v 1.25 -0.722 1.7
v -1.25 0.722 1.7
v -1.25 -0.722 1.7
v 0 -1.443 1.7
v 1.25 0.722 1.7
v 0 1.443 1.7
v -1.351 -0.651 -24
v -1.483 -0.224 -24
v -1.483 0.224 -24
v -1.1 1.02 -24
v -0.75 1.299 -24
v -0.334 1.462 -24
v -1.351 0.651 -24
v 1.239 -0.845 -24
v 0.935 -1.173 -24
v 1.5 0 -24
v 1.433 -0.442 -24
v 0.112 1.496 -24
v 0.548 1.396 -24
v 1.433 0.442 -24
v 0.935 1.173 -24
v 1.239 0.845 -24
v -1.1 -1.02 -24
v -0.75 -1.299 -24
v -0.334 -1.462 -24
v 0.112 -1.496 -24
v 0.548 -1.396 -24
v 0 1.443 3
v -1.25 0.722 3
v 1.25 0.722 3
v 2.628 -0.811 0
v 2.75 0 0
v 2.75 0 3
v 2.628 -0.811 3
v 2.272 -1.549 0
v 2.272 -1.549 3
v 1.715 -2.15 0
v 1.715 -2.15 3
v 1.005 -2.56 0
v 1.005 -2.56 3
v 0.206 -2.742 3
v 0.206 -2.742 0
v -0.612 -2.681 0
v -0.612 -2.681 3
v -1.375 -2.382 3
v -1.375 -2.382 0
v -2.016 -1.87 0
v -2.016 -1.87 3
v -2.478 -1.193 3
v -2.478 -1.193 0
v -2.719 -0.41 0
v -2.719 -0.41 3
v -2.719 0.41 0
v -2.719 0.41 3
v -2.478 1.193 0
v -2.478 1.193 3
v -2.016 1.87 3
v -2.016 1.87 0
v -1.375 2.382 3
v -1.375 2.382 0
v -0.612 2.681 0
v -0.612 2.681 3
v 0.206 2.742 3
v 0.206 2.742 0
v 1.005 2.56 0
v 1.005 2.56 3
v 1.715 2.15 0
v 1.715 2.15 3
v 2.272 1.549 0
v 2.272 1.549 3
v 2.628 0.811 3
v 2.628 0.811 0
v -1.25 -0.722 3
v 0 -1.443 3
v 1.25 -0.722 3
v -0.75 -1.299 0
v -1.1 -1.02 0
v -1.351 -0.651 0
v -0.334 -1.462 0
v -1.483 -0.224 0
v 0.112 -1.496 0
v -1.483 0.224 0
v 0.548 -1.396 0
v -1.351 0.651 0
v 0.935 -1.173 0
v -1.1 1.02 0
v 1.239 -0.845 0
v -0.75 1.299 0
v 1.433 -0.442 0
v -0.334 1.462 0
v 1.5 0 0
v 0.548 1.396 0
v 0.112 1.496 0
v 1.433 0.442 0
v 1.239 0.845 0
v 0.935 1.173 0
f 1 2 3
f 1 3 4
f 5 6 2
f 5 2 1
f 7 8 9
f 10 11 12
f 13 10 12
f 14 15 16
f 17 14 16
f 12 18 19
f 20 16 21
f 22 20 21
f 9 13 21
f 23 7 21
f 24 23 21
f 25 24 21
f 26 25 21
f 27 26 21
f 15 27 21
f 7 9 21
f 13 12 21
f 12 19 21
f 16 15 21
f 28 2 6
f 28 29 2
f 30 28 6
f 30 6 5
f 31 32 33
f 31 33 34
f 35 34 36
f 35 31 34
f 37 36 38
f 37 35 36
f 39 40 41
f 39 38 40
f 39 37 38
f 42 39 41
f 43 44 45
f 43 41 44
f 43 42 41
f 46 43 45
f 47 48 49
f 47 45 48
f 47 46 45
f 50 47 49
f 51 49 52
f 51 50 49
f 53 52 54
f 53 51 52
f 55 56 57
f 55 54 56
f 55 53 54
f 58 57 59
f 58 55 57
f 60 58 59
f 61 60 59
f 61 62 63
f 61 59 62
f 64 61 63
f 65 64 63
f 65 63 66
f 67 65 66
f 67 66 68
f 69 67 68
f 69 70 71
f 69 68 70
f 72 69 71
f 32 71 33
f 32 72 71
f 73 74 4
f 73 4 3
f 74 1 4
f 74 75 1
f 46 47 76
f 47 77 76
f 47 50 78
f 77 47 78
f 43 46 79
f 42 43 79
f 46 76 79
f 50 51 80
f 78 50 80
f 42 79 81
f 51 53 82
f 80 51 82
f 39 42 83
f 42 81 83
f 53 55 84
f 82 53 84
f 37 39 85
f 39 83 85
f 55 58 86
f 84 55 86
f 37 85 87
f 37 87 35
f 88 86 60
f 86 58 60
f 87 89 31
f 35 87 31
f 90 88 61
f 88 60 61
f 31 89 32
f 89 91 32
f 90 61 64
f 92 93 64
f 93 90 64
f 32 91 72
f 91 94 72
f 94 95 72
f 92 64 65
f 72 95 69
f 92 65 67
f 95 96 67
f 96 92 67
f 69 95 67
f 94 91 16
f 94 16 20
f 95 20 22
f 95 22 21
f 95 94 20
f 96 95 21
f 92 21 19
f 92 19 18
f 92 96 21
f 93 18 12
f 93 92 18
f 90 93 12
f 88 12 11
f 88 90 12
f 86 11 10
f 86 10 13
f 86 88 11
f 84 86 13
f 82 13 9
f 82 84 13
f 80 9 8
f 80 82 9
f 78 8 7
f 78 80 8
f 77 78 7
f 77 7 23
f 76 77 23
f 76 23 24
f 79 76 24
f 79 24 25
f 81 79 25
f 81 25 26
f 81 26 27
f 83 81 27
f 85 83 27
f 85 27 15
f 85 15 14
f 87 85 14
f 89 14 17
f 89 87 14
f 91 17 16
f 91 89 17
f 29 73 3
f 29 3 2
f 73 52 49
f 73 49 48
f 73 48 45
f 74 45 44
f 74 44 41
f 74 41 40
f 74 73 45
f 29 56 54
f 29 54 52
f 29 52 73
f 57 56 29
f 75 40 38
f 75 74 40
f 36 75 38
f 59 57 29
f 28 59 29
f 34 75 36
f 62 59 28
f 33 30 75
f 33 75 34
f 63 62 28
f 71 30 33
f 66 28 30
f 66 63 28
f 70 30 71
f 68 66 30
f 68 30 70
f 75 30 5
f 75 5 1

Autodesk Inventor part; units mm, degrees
ref_plane "YZ Plane" through (0, 0, 0) normal (1, 0, 0) x (0, 1, 0)
ref_plane "XZ Plane" through (0, 0, 0) normal (0, 1, 0) x (-1, 0, 0)
ref_plane "XY Plane" through (0, 0, 0) normal (0, 0, 1) x (1, 0, 0)
sketch "スケッチ1" plane through (0, 0, 0) normal (0, 0, 1) x (1, 0, 0)
  circle A0 centre (0, 0) radius 1.5
  dimension "d0" = 3
extrude "押し出し1" add sketch "スケッチ1" against normal blind 24
sketch "スケッチ2" plane through (0, 0, 0) normal (0, 0, 1) x (1, 0, 0)
  circle A0 centre (0, 0) radius 2.75
  dimension "d3" = 5.5
extrude "押し出し2" add sketch "スケッチ2" along normal blind 3
sketch "スケッチ3" plane through (0, 0, 3) normal (0, 0, 1) x (1, 0, 0)
  line L0 (0, 1.4434) -> (1.25, 0.7217)
  line L1 (1.25, 0.7217) -> (1.25, -0.7217)
  line L2 (1.25, -0.7217) -> (0, -1.4434)
  line L3 (0, -1.4434) -> (-1.25, -0.7217)
  line L4 (-1.25, -0.7217) -> (-1.25, 0.7217)
  line L5 (-1.25, 0.7217) -> (0, 1.4434)
  point P0 (0, 0)
  point P1 (0, 0)
  dimension "d6" = 2.5
extrude "押し出し3" cut sketch "スケッチ3" against normal blind 1.3
thread "ねじ1" size "M3x0.5" class "6g" standard "ANSI Metric M Profile" full length
properties part number "M3キャップボルト 24" material "鋼、高強度、低合金"
